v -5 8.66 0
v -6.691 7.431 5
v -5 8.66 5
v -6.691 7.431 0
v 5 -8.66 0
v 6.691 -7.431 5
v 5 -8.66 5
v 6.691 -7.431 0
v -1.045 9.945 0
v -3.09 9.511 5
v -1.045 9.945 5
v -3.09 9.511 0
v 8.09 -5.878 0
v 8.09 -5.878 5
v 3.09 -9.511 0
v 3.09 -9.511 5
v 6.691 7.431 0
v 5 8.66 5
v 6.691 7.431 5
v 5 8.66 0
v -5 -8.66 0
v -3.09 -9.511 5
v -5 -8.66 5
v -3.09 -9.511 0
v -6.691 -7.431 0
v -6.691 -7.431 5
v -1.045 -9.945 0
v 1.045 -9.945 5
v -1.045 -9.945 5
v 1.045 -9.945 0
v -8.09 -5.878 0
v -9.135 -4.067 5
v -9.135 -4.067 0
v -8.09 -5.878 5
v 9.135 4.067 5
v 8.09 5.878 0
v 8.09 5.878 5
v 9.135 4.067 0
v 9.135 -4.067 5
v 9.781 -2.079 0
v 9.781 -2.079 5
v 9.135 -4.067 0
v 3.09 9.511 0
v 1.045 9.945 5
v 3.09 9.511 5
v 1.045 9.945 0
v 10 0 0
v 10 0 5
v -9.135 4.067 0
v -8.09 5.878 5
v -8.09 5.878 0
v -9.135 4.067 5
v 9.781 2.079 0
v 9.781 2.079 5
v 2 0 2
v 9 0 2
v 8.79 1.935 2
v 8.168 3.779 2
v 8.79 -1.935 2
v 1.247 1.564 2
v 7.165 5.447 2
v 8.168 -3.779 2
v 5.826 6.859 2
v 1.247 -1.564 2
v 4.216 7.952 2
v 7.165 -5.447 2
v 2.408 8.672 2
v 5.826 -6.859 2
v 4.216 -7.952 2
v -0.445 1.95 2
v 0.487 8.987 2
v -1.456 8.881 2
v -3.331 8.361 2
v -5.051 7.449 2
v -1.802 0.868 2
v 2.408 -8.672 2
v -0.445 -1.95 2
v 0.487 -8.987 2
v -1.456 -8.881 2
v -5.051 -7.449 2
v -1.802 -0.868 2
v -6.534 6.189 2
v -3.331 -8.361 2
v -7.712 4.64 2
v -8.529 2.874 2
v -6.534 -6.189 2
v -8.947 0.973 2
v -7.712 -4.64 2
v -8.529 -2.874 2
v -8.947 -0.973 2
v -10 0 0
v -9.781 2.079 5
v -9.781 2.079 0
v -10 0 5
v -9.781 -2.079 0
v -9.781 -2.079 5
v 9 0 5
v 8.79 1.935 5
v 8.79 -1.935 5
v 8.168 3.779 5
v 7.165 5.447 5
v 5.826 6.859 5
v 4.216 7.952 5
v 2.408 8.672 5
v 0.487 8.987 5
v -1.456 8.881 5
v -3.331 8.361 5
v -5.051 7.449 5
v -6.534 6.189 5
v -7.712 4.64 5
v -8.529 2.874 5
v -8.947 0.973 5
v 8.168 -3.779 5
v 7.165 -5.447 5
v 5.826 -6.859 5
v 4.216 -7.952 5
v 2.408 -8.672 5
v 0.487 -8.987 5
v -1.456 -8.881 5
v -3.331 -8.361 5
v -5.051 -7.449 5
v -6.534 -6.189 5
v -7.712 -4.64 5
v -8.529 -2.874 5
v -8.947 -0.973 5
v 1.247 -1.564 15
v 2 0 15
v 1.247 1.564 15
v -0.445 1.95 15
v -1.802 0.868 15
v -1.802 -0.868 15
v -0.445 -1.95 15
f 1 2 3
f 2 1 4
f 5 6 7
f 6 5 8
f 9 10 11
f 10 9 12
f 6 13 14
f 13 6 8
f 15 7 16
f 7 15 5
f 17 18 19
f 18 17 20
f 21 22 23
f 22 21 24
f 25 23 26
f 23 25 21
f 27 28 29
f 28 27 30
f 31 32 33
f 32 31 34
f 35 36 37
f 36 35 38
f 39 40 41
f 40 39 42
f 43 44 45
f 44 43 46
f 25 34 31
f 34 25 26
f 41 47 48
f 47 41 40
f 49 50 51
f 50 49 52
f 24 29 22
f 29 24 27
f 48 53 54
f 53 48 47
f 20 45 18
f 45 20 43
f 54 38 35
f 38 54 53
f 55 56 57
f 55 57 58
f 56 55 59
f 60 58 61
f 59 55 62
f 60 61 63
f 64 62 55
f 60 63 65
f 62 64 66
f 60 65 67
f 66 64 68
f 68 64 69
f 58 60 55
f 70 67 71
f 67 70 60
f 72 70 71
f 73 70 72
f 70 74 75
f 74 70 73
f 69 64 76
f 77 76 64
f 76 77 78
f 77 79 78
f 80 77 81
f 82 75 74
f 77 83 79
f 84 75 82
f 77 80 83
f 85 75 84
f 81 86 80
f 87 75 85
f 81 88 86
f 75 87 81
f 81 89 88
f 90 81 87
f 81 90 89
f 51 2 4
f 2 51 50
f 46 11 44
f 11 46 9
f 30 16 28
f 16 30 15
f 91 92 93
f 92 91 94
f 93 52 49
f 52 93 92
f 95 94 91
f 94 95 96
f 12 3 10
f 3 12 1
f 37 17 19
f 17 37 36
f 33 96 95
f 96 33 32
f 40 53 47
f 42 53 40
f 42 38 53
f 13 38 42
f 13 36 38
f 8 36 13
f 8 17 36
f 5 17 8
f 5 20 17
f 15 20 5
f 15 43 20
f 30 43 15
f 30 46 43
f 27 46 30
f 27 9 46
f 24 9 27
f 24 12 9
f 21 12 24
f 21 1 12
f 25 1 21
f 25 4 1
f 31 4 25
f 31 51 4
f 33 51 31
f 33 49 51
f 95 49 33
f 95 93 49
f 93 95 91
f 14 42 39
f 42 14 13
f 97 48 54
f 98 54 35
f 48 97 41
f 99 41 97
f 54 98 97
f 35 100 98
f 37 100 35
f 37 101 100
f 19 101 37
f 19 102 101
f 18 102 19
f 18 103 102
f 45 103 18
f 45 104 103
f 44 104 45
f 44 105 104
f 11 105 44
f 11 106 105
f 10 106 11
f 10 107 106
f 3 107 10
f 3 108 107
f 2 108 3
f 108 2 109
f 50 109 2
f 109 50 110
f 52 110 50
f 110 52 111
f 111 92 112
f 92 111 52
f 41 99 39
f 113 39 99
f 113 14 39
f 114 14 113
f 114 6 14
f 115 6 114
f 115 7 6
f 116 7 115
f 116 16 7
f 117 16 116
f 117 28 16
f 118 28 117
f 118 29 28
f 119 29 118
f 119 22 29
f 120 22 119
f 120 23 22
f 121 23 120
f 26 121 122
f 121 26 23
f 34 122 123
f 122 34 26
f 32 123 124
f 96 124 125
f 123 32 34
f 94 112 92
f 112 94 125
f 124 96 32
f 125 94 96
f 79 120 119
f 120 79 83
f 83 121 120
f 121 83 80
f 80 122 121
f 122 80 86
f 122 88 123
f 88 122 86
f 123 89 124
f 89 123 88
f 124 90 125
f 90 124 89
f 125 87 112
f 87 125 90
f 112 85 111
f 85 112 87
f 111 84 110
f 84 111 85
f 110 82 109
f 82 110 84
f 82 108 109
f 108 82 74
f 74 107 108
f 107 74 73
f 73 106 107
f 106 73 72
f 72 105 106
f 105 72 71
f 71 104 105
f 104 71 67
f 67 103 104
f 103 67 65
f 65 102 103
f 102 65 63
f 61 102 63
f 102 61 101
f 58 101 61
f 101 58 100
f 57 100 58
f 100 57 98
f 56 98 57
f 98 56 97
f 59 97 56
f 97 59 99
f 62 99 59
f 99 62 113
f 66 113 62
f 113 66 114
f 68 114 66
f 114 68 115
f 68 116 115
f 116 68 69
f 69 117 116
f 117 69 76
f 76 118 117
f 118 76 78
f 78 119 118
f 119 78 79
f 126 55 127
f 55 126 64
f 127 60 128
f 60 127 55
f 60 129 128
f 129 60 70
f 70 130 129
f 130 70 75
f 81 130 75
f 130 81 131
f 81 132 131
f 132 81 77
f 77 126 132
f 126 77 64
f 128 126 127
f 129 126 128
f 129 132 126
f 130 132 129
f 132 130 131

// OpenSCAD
// file: stack.scad
function layer_height(layer) = is_num(layer) ? layer : layer[1];
function layer_label(layer) = is_list(layer) ? layer[0] : undef;

function sum(l, start=0, end=undef) = let(last = is_undef(end) ? len(l) : end) start == last ? 0 : layer_height(l[start]) + sum(l, start+1, end);

module stack(layers=[]) {
  for($layer_index=[0:len(layers)-1]) {
    translate([0,0,sum(layers, end=$layer_index)]){
      let(
        layer = layers[$layer_index], 
        height = is_num(layer) ? layer : layer[1], 
        $layer_label = is_list(layer) ? layer[0] : undef
      ){
        assert(
          is_num(layer) 
          || is_list(layer) && len(layer) == 2 && is_string(layer[0]) && is_num(layer[1]), 
          "layers must be either <height> or [<label>, <height>]"
        );
        linear_extrude(height) children();
      }
    }
  }
}

function layer_active(layer) = layer == $layer_index || layer == $layer_label;

function any_layer_active(layers) = is_list(layers)
  ? search($layer_index, layers) != [] || search([$layer_label], layers) != [[]]
  : layer_active(layers);

module layer(layers) {
  assert(!is_undef($layer_index), "layer must be nested in stack");

  if(any_layer_active(layers)) {
    children();
  }
}
// main file
use <stack.scad>

stack([["base", 2],["rim", 3],10]) {
  difference(){
    layer(["base","rim"]) circle(d=20);
    layer("rim") circle(d=18);
  }
  circle(d=4);
}
